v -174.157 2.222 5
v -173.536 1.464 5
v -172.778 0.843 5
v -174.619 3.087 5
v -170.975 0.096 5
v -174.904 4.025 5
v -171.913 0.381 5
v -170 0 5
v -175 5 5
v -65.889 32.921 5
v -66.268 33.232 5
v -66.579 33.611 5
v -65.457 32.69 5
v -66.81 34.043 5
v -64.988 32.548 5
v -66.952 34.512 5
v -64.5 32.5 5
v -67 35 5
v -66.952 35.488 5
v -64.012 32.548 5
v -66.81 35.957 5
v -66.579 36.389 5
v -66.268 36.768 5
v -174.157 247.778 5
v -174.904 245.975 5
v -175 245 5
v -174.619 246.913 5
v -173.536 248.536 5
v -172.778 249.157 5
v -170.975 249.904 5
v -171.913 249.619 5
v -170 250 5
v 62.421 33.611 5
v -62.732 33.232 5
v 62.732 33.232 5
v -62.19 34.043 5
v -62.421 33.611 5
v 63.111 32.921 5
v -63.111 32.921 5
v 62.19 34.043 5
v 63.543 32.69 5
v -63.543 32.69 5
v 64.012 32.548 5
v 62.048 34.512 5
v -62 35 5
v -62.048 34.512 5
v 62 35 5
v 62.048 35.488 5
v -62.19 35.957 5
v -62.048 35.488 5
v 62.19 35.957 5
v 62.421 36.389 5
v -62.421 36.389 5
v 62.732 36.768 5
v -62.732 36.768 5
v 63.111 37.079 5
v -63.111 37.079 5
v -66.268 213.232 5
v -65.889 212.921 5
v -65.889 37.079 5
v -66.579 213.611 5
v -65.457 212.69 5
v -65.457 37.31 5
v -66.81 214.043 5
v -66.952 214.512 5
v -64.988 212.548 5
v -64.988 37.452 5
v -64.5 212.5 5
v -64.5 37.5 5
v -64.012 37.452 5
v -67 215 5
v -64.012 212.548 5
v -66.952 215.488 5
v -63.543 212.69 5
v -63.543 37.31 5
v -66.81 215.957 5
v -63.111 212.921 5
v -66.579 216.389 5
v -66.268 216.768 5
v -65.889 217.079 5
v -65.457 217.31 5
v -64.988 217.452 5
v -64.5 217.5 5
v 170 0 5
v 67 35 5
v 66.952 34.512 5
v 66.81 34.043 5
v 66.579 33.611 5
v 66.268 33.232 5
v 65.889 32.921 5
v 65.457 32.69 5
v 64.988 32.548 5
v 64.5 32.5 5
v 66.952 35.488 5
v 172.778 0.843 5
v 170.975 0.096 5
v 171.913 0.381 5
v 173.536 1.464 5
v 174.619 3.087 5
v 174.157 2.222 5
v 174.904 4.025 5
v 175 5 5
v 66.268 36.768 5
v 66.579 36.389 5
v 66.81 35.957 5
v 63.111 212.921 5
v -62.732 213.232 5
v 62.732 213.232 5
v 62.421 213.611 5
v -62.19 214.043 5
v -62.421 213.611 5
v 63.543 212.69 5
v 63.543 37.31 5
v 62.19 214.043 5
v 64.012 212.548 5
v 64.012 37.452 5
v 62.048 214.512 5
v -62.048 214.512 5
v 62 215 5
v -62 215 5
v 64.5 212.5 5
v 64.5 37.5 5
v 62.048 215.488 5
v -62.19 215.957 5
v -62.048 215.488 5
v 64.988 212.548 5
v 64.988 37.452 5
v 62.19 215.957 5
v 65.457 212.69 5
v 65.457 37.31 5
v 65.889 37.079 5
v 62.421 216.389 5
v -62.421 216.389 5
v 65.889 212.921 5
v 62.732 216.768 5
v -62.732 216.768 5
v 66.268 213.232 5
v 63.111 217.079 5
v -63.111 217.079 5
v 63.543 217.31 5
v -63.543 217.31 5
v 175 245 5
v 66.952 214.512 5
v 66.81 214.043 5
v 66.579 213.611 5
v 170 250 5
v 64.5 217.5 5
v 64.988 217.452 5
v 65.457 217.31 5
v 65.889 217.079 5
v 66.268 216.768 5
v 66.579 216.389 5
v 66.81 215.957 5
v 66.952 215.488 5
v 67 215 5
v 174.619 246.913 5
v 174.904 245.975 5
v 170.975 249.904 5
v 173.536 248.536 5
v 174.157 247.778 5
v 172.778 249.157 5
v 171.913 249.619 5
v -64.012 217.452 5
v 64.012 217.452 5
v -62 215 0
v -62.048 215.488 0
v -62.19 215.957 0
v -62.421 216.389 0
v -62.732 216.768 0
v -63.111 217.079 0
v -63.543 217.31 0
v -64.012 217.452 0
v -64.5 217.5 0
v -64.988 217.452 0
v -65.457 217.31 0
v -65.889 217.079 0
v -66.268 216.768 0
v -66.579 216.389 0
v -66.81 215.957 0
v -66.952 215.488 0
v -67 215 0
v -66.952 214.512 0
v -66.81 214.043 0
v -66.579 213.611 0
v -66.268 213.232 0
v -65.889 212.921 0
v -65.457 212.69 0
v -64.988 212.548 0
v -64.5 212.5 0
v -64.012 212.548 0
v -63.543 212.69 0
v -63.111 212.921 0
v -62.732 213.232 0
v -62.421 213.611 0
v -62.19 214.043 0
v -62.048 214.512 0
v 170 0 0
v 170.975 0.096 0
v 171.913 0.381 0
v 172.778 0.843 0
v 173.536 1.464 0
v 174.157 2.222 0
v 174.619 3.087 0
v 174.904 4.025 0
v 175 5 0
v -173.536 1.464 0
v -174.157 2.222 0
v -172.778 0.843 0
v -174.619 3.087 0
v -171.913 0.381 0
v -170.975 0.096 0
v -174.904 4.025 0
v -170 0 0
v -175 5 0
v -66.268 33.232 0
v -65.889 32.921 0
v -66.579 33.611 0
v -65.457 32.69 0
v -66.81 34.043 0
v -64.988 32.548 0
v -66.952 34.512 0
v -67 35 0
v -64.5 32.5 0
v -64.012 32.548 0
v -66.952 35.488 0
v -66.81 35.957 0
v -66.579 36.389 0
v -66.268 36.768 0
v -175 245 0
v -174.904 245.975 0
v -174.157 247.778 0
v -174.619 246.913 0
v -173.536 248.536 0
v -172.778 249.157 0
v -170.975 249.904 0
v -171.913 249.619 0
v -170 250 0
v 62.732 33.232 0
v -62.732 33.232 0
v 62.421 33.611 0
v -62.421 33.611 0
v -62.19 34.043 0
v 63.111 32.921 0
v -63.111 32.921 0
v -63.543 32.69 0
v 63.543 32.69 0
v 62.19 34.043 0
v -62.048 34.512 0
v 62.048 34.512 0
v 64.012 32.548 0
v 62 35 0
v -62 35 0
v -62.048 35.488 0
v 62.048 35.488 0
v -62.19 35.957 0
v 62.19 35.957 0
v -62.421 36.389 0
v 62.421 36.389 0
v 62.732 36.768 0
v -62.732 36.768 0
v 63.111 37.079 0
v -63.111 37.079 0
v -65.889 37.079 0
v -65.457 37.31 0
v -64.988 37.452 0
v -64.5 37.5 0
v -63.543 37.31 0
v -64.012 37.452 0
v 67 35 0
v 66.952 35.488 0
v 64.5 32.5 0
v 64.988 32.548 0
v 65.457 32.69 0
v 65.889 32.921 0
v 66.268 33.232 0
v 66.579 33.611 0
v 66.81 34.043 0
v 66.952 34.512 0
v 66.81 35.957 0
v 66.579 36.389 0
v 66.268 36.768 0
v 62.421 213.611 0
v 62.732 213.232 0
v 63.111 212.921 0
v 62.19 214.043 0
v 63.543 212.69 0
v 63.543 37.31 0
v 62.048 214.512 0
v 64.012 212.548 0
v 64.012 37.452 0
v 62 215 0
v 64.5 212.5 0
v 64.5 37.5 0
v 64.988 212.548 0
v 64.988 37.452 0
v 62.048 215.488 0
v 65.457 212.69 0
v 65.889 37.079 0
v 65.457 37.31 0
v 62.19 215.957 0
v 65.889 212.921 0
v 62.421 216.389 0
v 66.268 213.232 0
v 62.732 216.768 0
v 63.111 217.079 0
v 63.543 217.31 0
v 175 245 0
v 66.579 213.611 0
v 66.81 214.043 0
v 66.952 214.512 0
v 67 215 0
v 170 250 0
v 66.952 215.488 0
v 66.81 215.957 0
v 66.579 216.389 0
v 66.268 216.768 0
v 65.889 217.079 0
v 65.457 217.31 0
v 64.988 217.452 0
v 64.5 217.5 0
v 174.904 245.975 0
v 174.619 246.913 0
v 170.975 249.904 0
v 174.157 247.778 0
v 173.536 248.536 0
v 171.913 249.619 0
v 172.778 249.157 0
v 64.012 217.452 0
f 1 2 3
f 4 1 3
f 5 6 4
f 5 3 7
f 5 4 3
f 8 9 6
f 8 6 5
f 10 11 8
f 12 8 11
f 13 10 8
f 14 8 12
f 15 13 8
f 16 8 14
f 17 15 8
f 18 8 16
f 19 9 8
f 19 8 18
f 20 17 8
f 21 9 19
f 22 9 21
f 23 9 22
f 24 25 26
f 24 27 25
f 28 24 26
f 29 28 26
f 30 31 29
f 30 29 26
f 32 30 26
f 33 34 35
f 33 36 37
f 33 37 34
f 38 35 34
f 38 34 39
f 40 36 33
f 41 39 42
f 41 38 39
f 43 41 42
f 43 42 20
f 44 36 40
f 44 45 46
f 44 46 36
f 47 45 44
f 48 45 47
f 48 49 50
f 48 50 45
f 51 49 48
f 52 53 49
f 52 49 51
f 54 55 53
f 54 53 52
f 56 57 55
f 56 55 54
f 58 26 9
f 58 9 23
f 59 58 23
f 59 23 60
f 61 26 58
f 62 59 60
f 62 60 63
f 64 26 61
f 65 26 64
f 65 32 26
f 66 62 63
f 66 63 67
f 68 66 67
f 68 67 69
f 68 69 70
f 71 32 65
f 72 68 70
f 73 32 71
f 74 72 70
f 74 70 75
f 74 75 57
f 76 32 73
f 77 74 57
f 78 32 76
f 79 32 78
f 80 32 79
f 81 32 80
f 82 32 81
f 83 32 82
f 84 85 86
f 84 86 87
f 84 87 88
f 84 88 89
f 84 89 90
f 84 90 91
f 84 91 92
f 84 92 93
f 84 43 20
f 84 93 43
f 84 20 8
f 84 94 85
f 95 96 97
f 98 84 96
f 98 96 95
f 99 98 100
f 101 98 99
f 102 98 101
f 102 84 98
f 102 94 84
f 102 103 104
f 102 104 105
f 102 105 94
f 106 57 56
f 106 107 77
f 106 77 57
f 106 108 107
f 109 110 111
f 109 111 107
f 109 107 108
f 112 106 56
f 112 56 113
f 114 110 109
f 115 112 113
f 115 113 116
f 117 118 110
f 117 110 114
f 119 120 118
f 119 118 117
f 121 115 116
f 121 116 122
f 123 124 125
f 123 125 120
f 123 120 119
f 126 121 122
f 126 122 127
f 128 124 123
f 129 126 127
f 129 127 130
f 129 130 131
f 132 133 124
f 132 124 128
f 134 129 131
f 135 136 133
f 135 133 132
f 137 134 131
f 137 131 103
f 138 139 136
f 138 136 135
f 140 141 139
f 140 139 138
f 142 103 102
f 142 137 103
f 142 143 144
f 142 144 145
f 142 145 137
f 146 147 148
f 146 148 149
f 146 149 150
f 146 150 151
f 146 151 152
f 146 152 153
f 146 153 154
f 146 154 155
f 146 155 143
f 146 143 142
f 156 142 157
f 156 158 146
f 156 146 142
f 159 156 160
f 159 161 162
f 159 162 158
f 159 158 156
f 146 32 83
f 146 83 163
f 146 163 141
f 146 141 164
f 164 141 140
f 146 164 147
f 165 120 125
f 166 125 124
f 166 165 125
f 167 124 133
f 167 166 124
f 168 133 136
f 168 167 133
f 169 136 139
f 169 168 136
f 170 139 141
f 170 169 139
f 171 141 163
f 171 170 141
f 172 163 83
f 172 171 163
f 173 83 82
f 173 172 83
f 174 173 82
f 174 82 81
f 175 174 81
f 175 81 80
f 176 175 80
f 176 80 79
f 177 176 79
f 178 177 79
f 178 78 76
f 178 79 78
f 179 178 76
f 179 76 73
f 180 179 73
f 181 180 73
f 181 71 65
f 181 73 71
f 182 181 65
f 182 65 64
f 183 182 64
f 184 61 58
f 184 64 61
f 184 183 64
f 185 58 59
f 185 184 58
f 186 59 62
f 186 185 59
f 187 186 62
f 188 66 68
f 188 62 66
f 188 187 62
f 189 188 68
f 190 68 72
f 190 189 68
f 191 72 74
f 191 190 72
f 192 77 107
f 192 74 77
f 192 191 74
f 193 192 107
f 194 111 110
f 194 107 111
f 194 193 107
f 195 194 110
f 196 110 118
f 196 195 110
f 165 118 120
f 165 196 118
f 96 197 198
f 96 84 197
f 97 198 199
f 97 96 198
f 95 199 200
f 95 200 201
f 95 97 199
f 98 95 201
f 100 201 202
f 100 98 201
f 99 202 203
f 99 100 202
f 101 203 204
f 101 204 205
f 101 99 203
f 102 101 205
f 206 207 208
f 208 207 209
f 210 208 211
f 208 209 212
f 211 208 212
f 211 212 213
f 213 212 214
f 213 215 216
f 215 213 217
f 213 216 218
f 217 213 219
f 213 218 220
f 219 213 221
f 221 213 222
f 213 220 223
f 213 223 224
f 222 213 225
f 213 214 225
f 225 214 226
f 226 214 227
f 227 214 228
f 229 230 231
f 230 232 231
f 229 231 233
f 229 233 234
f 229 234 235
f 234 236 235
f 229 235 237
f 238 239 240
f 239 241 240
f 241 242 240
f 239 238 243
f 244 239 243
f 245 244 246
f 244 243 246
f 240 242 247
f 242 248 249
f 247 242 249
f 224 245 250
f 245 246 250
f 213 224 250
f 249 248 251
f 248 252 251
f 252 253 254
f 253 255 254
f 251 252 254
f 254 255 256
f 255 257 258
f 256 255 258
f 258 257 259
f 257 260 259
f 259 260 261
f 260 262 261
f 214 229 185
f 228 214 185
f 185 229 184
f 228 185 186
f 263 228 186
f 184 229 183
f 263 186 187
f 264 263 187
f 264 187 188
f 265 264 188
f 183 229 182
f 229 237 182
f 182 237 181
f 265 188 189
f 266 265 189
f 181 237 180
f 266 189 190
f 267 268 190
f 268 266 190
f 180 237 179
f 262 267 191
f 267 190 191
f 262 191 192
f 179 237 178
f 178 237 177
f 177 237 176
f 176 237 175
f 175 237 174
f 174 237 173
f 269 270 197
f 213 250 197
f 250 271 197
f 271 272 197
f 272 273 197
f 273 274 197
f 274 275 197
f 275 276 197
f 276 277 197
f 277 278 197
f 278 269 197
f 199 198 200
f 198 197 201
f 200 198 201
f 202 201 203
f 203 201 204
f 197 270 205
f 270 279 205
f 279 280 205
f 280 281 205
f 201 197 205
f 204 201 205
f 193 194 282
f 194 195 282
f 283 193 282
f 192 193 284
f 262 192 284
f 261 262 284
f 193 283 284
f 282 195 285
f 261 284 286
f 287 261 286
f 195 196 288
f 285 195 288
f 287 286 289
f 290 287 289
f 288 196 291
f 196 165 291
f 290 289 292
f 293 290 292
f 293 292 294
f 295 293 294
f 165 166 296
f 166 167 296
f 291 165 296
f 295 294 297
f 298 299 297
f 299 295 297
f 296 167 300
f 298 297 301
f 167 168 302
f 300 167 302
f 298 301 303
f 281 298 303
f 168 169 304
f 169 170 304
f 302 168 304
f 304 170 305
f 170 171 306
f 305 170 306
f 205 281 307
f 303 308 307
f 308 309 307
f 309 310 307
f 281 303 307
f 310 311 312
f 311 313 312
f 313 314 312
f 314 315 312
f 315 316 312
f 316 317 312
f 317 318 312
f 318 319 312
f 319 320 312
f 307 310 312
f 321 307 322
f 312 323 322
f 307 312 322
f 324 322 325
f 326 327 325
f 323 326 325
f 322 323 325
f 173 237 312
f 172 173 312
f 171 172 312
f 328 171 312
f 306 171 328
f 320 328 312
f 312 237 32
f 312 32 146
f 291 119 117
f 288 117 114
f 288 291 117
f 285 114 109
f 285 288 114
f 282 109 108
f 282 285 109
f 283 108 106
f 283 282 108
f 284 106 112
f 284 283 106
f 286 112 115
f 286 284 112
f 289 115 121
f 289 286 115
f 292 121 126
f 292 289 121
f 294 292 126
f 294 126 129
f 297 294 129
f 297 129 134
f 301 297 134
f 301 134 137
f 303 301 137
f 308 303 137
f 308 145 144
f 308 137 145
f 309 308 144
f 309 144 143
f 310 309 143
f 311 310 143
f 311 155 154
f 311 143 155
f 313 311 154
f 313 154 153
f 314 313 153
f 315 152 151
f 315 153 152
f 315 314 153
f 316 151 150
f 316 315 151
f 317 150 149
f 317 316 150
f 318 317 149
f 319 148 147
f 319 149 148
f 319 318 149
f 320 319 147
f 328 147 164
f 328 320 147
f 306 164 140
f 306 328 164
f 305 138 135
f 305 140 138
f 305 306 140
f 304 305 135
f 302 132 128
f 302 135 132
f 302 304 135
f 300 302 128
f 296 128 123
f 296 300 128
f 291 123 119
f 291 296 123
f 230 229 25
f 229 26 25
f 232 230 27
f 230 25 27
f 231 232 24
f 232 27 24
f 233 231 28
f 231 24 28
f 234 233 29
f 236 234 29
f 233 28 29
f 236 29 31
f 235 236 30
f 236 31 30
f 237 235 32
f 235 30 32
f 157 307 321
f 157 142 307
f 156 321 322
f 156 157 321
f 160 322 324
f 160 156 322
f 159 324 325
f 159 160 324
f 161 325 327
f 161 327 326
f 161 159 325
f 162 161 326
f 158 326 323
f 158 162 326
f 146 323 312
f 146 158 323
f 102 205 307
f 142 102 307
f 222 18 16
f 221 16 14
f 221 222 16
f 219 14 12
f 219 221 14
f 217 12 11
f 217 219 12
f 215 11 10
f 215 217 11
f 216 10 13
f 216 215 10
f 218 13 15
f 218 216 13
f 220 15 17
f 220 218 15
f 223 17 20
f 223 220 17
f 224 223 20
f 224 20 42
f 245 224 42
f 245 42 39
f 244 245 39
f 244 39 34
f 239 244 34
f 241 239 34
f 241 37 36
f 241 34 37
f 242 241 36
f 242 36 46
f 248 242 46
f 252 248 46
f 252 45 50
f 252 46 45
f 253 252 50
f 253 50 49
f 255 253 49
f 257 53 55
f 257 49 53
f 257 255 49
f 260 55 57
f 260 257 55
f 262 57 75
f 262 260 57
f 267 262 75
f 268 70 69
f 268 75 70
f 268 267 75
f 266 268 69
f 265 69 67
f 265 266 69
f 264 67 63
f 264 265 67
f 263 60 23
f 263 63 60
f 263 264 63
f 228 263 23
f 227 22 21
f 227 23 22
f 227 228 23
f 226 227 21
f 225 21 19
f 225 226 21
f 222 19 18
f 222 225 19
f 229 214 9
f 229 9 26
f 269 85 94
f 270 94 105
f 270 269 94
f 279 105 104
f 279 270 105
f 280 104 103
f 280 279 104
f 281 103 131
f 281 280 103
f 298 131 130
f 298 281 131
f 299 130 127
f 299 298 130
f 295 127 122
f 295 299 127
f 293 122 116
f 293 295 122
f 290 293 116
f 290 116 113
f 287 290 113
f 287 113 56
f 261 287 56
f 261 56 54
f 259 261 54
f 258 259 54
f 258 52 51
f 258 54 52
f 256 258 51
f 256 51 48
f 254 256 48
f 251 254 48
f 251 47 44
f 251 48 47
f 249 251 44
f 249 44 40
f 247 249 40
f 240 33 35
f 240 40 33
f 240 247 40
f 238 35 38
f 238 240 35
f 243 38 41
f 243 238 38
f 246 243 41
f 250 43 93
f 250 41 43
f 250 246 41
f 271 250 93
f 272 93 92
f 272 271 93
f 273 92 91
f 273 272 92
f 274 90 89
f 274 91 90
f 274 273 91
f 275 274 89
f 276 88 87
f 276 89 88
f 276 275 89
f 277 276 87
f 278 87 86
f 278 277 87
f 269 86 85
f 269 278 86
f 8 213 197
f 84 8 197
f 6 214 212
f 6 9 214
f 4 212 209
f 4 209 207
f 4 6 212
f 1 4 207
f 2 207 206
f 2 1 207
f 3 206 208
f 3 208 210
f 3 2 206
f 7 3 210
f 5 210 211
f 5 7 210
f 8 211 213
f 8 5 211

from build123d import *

# Parameters (mm, degrees)
ESQUISSE1_W             = 350
ESQUISSE1_H             = 250
BOSS_EXTRU_1_DEPTH      = 5
CONG_1_R                = 5
ESQUISSE2_R             = 2.5
ENL_V_MAT_EXTRU_1_DEPTH = 10


with BuildPart() as part:
    # Esquisse1 → Boss.-Extru.1 (new body)
    with BuildSketch(Plane.XY):
        with Locations((0, 125)):
            Rectangle(ESQUISSE1_W, ESQUISSE1_H)
    extrude(amount=BOSS_EXTRU_1_DEPTH)

    # Congé1
    cong_1_edges = [part.edges().sort_by_distance(p)[0] for p in [
        (-175, 250, 2.5),
        (175, 250, 2.5),
        (175, 0, 2.5),
        (-175, 0, 2.5),
    ]]
    fillet(cong_1_edges, radius=CONG_1_R)

    # Esquisse2 → Enlèv. mat.-Extru.1 (cut)
    with BuildSketch(Plane.XY):
        with Locations((64.5, 35)):
            Circle(ESQUISSE2_R)
        with Locations(Location((-64.5, 35, 0), (0, 0, 180))):
            Circle(ESQUISSE2_R)
        with Locations((-64.5, 215)):
            Circle(ESQUISSE2_R)
        with Locations(Location((64.5, 215, 0), (0, 0, 180))):
            Circle(ESQUISSE2_R)
    extrude(amount=ENL_V_MAT_EXTRU_1_DEPTH, mode=Mode.SUBTRACT)


solid = part.part
